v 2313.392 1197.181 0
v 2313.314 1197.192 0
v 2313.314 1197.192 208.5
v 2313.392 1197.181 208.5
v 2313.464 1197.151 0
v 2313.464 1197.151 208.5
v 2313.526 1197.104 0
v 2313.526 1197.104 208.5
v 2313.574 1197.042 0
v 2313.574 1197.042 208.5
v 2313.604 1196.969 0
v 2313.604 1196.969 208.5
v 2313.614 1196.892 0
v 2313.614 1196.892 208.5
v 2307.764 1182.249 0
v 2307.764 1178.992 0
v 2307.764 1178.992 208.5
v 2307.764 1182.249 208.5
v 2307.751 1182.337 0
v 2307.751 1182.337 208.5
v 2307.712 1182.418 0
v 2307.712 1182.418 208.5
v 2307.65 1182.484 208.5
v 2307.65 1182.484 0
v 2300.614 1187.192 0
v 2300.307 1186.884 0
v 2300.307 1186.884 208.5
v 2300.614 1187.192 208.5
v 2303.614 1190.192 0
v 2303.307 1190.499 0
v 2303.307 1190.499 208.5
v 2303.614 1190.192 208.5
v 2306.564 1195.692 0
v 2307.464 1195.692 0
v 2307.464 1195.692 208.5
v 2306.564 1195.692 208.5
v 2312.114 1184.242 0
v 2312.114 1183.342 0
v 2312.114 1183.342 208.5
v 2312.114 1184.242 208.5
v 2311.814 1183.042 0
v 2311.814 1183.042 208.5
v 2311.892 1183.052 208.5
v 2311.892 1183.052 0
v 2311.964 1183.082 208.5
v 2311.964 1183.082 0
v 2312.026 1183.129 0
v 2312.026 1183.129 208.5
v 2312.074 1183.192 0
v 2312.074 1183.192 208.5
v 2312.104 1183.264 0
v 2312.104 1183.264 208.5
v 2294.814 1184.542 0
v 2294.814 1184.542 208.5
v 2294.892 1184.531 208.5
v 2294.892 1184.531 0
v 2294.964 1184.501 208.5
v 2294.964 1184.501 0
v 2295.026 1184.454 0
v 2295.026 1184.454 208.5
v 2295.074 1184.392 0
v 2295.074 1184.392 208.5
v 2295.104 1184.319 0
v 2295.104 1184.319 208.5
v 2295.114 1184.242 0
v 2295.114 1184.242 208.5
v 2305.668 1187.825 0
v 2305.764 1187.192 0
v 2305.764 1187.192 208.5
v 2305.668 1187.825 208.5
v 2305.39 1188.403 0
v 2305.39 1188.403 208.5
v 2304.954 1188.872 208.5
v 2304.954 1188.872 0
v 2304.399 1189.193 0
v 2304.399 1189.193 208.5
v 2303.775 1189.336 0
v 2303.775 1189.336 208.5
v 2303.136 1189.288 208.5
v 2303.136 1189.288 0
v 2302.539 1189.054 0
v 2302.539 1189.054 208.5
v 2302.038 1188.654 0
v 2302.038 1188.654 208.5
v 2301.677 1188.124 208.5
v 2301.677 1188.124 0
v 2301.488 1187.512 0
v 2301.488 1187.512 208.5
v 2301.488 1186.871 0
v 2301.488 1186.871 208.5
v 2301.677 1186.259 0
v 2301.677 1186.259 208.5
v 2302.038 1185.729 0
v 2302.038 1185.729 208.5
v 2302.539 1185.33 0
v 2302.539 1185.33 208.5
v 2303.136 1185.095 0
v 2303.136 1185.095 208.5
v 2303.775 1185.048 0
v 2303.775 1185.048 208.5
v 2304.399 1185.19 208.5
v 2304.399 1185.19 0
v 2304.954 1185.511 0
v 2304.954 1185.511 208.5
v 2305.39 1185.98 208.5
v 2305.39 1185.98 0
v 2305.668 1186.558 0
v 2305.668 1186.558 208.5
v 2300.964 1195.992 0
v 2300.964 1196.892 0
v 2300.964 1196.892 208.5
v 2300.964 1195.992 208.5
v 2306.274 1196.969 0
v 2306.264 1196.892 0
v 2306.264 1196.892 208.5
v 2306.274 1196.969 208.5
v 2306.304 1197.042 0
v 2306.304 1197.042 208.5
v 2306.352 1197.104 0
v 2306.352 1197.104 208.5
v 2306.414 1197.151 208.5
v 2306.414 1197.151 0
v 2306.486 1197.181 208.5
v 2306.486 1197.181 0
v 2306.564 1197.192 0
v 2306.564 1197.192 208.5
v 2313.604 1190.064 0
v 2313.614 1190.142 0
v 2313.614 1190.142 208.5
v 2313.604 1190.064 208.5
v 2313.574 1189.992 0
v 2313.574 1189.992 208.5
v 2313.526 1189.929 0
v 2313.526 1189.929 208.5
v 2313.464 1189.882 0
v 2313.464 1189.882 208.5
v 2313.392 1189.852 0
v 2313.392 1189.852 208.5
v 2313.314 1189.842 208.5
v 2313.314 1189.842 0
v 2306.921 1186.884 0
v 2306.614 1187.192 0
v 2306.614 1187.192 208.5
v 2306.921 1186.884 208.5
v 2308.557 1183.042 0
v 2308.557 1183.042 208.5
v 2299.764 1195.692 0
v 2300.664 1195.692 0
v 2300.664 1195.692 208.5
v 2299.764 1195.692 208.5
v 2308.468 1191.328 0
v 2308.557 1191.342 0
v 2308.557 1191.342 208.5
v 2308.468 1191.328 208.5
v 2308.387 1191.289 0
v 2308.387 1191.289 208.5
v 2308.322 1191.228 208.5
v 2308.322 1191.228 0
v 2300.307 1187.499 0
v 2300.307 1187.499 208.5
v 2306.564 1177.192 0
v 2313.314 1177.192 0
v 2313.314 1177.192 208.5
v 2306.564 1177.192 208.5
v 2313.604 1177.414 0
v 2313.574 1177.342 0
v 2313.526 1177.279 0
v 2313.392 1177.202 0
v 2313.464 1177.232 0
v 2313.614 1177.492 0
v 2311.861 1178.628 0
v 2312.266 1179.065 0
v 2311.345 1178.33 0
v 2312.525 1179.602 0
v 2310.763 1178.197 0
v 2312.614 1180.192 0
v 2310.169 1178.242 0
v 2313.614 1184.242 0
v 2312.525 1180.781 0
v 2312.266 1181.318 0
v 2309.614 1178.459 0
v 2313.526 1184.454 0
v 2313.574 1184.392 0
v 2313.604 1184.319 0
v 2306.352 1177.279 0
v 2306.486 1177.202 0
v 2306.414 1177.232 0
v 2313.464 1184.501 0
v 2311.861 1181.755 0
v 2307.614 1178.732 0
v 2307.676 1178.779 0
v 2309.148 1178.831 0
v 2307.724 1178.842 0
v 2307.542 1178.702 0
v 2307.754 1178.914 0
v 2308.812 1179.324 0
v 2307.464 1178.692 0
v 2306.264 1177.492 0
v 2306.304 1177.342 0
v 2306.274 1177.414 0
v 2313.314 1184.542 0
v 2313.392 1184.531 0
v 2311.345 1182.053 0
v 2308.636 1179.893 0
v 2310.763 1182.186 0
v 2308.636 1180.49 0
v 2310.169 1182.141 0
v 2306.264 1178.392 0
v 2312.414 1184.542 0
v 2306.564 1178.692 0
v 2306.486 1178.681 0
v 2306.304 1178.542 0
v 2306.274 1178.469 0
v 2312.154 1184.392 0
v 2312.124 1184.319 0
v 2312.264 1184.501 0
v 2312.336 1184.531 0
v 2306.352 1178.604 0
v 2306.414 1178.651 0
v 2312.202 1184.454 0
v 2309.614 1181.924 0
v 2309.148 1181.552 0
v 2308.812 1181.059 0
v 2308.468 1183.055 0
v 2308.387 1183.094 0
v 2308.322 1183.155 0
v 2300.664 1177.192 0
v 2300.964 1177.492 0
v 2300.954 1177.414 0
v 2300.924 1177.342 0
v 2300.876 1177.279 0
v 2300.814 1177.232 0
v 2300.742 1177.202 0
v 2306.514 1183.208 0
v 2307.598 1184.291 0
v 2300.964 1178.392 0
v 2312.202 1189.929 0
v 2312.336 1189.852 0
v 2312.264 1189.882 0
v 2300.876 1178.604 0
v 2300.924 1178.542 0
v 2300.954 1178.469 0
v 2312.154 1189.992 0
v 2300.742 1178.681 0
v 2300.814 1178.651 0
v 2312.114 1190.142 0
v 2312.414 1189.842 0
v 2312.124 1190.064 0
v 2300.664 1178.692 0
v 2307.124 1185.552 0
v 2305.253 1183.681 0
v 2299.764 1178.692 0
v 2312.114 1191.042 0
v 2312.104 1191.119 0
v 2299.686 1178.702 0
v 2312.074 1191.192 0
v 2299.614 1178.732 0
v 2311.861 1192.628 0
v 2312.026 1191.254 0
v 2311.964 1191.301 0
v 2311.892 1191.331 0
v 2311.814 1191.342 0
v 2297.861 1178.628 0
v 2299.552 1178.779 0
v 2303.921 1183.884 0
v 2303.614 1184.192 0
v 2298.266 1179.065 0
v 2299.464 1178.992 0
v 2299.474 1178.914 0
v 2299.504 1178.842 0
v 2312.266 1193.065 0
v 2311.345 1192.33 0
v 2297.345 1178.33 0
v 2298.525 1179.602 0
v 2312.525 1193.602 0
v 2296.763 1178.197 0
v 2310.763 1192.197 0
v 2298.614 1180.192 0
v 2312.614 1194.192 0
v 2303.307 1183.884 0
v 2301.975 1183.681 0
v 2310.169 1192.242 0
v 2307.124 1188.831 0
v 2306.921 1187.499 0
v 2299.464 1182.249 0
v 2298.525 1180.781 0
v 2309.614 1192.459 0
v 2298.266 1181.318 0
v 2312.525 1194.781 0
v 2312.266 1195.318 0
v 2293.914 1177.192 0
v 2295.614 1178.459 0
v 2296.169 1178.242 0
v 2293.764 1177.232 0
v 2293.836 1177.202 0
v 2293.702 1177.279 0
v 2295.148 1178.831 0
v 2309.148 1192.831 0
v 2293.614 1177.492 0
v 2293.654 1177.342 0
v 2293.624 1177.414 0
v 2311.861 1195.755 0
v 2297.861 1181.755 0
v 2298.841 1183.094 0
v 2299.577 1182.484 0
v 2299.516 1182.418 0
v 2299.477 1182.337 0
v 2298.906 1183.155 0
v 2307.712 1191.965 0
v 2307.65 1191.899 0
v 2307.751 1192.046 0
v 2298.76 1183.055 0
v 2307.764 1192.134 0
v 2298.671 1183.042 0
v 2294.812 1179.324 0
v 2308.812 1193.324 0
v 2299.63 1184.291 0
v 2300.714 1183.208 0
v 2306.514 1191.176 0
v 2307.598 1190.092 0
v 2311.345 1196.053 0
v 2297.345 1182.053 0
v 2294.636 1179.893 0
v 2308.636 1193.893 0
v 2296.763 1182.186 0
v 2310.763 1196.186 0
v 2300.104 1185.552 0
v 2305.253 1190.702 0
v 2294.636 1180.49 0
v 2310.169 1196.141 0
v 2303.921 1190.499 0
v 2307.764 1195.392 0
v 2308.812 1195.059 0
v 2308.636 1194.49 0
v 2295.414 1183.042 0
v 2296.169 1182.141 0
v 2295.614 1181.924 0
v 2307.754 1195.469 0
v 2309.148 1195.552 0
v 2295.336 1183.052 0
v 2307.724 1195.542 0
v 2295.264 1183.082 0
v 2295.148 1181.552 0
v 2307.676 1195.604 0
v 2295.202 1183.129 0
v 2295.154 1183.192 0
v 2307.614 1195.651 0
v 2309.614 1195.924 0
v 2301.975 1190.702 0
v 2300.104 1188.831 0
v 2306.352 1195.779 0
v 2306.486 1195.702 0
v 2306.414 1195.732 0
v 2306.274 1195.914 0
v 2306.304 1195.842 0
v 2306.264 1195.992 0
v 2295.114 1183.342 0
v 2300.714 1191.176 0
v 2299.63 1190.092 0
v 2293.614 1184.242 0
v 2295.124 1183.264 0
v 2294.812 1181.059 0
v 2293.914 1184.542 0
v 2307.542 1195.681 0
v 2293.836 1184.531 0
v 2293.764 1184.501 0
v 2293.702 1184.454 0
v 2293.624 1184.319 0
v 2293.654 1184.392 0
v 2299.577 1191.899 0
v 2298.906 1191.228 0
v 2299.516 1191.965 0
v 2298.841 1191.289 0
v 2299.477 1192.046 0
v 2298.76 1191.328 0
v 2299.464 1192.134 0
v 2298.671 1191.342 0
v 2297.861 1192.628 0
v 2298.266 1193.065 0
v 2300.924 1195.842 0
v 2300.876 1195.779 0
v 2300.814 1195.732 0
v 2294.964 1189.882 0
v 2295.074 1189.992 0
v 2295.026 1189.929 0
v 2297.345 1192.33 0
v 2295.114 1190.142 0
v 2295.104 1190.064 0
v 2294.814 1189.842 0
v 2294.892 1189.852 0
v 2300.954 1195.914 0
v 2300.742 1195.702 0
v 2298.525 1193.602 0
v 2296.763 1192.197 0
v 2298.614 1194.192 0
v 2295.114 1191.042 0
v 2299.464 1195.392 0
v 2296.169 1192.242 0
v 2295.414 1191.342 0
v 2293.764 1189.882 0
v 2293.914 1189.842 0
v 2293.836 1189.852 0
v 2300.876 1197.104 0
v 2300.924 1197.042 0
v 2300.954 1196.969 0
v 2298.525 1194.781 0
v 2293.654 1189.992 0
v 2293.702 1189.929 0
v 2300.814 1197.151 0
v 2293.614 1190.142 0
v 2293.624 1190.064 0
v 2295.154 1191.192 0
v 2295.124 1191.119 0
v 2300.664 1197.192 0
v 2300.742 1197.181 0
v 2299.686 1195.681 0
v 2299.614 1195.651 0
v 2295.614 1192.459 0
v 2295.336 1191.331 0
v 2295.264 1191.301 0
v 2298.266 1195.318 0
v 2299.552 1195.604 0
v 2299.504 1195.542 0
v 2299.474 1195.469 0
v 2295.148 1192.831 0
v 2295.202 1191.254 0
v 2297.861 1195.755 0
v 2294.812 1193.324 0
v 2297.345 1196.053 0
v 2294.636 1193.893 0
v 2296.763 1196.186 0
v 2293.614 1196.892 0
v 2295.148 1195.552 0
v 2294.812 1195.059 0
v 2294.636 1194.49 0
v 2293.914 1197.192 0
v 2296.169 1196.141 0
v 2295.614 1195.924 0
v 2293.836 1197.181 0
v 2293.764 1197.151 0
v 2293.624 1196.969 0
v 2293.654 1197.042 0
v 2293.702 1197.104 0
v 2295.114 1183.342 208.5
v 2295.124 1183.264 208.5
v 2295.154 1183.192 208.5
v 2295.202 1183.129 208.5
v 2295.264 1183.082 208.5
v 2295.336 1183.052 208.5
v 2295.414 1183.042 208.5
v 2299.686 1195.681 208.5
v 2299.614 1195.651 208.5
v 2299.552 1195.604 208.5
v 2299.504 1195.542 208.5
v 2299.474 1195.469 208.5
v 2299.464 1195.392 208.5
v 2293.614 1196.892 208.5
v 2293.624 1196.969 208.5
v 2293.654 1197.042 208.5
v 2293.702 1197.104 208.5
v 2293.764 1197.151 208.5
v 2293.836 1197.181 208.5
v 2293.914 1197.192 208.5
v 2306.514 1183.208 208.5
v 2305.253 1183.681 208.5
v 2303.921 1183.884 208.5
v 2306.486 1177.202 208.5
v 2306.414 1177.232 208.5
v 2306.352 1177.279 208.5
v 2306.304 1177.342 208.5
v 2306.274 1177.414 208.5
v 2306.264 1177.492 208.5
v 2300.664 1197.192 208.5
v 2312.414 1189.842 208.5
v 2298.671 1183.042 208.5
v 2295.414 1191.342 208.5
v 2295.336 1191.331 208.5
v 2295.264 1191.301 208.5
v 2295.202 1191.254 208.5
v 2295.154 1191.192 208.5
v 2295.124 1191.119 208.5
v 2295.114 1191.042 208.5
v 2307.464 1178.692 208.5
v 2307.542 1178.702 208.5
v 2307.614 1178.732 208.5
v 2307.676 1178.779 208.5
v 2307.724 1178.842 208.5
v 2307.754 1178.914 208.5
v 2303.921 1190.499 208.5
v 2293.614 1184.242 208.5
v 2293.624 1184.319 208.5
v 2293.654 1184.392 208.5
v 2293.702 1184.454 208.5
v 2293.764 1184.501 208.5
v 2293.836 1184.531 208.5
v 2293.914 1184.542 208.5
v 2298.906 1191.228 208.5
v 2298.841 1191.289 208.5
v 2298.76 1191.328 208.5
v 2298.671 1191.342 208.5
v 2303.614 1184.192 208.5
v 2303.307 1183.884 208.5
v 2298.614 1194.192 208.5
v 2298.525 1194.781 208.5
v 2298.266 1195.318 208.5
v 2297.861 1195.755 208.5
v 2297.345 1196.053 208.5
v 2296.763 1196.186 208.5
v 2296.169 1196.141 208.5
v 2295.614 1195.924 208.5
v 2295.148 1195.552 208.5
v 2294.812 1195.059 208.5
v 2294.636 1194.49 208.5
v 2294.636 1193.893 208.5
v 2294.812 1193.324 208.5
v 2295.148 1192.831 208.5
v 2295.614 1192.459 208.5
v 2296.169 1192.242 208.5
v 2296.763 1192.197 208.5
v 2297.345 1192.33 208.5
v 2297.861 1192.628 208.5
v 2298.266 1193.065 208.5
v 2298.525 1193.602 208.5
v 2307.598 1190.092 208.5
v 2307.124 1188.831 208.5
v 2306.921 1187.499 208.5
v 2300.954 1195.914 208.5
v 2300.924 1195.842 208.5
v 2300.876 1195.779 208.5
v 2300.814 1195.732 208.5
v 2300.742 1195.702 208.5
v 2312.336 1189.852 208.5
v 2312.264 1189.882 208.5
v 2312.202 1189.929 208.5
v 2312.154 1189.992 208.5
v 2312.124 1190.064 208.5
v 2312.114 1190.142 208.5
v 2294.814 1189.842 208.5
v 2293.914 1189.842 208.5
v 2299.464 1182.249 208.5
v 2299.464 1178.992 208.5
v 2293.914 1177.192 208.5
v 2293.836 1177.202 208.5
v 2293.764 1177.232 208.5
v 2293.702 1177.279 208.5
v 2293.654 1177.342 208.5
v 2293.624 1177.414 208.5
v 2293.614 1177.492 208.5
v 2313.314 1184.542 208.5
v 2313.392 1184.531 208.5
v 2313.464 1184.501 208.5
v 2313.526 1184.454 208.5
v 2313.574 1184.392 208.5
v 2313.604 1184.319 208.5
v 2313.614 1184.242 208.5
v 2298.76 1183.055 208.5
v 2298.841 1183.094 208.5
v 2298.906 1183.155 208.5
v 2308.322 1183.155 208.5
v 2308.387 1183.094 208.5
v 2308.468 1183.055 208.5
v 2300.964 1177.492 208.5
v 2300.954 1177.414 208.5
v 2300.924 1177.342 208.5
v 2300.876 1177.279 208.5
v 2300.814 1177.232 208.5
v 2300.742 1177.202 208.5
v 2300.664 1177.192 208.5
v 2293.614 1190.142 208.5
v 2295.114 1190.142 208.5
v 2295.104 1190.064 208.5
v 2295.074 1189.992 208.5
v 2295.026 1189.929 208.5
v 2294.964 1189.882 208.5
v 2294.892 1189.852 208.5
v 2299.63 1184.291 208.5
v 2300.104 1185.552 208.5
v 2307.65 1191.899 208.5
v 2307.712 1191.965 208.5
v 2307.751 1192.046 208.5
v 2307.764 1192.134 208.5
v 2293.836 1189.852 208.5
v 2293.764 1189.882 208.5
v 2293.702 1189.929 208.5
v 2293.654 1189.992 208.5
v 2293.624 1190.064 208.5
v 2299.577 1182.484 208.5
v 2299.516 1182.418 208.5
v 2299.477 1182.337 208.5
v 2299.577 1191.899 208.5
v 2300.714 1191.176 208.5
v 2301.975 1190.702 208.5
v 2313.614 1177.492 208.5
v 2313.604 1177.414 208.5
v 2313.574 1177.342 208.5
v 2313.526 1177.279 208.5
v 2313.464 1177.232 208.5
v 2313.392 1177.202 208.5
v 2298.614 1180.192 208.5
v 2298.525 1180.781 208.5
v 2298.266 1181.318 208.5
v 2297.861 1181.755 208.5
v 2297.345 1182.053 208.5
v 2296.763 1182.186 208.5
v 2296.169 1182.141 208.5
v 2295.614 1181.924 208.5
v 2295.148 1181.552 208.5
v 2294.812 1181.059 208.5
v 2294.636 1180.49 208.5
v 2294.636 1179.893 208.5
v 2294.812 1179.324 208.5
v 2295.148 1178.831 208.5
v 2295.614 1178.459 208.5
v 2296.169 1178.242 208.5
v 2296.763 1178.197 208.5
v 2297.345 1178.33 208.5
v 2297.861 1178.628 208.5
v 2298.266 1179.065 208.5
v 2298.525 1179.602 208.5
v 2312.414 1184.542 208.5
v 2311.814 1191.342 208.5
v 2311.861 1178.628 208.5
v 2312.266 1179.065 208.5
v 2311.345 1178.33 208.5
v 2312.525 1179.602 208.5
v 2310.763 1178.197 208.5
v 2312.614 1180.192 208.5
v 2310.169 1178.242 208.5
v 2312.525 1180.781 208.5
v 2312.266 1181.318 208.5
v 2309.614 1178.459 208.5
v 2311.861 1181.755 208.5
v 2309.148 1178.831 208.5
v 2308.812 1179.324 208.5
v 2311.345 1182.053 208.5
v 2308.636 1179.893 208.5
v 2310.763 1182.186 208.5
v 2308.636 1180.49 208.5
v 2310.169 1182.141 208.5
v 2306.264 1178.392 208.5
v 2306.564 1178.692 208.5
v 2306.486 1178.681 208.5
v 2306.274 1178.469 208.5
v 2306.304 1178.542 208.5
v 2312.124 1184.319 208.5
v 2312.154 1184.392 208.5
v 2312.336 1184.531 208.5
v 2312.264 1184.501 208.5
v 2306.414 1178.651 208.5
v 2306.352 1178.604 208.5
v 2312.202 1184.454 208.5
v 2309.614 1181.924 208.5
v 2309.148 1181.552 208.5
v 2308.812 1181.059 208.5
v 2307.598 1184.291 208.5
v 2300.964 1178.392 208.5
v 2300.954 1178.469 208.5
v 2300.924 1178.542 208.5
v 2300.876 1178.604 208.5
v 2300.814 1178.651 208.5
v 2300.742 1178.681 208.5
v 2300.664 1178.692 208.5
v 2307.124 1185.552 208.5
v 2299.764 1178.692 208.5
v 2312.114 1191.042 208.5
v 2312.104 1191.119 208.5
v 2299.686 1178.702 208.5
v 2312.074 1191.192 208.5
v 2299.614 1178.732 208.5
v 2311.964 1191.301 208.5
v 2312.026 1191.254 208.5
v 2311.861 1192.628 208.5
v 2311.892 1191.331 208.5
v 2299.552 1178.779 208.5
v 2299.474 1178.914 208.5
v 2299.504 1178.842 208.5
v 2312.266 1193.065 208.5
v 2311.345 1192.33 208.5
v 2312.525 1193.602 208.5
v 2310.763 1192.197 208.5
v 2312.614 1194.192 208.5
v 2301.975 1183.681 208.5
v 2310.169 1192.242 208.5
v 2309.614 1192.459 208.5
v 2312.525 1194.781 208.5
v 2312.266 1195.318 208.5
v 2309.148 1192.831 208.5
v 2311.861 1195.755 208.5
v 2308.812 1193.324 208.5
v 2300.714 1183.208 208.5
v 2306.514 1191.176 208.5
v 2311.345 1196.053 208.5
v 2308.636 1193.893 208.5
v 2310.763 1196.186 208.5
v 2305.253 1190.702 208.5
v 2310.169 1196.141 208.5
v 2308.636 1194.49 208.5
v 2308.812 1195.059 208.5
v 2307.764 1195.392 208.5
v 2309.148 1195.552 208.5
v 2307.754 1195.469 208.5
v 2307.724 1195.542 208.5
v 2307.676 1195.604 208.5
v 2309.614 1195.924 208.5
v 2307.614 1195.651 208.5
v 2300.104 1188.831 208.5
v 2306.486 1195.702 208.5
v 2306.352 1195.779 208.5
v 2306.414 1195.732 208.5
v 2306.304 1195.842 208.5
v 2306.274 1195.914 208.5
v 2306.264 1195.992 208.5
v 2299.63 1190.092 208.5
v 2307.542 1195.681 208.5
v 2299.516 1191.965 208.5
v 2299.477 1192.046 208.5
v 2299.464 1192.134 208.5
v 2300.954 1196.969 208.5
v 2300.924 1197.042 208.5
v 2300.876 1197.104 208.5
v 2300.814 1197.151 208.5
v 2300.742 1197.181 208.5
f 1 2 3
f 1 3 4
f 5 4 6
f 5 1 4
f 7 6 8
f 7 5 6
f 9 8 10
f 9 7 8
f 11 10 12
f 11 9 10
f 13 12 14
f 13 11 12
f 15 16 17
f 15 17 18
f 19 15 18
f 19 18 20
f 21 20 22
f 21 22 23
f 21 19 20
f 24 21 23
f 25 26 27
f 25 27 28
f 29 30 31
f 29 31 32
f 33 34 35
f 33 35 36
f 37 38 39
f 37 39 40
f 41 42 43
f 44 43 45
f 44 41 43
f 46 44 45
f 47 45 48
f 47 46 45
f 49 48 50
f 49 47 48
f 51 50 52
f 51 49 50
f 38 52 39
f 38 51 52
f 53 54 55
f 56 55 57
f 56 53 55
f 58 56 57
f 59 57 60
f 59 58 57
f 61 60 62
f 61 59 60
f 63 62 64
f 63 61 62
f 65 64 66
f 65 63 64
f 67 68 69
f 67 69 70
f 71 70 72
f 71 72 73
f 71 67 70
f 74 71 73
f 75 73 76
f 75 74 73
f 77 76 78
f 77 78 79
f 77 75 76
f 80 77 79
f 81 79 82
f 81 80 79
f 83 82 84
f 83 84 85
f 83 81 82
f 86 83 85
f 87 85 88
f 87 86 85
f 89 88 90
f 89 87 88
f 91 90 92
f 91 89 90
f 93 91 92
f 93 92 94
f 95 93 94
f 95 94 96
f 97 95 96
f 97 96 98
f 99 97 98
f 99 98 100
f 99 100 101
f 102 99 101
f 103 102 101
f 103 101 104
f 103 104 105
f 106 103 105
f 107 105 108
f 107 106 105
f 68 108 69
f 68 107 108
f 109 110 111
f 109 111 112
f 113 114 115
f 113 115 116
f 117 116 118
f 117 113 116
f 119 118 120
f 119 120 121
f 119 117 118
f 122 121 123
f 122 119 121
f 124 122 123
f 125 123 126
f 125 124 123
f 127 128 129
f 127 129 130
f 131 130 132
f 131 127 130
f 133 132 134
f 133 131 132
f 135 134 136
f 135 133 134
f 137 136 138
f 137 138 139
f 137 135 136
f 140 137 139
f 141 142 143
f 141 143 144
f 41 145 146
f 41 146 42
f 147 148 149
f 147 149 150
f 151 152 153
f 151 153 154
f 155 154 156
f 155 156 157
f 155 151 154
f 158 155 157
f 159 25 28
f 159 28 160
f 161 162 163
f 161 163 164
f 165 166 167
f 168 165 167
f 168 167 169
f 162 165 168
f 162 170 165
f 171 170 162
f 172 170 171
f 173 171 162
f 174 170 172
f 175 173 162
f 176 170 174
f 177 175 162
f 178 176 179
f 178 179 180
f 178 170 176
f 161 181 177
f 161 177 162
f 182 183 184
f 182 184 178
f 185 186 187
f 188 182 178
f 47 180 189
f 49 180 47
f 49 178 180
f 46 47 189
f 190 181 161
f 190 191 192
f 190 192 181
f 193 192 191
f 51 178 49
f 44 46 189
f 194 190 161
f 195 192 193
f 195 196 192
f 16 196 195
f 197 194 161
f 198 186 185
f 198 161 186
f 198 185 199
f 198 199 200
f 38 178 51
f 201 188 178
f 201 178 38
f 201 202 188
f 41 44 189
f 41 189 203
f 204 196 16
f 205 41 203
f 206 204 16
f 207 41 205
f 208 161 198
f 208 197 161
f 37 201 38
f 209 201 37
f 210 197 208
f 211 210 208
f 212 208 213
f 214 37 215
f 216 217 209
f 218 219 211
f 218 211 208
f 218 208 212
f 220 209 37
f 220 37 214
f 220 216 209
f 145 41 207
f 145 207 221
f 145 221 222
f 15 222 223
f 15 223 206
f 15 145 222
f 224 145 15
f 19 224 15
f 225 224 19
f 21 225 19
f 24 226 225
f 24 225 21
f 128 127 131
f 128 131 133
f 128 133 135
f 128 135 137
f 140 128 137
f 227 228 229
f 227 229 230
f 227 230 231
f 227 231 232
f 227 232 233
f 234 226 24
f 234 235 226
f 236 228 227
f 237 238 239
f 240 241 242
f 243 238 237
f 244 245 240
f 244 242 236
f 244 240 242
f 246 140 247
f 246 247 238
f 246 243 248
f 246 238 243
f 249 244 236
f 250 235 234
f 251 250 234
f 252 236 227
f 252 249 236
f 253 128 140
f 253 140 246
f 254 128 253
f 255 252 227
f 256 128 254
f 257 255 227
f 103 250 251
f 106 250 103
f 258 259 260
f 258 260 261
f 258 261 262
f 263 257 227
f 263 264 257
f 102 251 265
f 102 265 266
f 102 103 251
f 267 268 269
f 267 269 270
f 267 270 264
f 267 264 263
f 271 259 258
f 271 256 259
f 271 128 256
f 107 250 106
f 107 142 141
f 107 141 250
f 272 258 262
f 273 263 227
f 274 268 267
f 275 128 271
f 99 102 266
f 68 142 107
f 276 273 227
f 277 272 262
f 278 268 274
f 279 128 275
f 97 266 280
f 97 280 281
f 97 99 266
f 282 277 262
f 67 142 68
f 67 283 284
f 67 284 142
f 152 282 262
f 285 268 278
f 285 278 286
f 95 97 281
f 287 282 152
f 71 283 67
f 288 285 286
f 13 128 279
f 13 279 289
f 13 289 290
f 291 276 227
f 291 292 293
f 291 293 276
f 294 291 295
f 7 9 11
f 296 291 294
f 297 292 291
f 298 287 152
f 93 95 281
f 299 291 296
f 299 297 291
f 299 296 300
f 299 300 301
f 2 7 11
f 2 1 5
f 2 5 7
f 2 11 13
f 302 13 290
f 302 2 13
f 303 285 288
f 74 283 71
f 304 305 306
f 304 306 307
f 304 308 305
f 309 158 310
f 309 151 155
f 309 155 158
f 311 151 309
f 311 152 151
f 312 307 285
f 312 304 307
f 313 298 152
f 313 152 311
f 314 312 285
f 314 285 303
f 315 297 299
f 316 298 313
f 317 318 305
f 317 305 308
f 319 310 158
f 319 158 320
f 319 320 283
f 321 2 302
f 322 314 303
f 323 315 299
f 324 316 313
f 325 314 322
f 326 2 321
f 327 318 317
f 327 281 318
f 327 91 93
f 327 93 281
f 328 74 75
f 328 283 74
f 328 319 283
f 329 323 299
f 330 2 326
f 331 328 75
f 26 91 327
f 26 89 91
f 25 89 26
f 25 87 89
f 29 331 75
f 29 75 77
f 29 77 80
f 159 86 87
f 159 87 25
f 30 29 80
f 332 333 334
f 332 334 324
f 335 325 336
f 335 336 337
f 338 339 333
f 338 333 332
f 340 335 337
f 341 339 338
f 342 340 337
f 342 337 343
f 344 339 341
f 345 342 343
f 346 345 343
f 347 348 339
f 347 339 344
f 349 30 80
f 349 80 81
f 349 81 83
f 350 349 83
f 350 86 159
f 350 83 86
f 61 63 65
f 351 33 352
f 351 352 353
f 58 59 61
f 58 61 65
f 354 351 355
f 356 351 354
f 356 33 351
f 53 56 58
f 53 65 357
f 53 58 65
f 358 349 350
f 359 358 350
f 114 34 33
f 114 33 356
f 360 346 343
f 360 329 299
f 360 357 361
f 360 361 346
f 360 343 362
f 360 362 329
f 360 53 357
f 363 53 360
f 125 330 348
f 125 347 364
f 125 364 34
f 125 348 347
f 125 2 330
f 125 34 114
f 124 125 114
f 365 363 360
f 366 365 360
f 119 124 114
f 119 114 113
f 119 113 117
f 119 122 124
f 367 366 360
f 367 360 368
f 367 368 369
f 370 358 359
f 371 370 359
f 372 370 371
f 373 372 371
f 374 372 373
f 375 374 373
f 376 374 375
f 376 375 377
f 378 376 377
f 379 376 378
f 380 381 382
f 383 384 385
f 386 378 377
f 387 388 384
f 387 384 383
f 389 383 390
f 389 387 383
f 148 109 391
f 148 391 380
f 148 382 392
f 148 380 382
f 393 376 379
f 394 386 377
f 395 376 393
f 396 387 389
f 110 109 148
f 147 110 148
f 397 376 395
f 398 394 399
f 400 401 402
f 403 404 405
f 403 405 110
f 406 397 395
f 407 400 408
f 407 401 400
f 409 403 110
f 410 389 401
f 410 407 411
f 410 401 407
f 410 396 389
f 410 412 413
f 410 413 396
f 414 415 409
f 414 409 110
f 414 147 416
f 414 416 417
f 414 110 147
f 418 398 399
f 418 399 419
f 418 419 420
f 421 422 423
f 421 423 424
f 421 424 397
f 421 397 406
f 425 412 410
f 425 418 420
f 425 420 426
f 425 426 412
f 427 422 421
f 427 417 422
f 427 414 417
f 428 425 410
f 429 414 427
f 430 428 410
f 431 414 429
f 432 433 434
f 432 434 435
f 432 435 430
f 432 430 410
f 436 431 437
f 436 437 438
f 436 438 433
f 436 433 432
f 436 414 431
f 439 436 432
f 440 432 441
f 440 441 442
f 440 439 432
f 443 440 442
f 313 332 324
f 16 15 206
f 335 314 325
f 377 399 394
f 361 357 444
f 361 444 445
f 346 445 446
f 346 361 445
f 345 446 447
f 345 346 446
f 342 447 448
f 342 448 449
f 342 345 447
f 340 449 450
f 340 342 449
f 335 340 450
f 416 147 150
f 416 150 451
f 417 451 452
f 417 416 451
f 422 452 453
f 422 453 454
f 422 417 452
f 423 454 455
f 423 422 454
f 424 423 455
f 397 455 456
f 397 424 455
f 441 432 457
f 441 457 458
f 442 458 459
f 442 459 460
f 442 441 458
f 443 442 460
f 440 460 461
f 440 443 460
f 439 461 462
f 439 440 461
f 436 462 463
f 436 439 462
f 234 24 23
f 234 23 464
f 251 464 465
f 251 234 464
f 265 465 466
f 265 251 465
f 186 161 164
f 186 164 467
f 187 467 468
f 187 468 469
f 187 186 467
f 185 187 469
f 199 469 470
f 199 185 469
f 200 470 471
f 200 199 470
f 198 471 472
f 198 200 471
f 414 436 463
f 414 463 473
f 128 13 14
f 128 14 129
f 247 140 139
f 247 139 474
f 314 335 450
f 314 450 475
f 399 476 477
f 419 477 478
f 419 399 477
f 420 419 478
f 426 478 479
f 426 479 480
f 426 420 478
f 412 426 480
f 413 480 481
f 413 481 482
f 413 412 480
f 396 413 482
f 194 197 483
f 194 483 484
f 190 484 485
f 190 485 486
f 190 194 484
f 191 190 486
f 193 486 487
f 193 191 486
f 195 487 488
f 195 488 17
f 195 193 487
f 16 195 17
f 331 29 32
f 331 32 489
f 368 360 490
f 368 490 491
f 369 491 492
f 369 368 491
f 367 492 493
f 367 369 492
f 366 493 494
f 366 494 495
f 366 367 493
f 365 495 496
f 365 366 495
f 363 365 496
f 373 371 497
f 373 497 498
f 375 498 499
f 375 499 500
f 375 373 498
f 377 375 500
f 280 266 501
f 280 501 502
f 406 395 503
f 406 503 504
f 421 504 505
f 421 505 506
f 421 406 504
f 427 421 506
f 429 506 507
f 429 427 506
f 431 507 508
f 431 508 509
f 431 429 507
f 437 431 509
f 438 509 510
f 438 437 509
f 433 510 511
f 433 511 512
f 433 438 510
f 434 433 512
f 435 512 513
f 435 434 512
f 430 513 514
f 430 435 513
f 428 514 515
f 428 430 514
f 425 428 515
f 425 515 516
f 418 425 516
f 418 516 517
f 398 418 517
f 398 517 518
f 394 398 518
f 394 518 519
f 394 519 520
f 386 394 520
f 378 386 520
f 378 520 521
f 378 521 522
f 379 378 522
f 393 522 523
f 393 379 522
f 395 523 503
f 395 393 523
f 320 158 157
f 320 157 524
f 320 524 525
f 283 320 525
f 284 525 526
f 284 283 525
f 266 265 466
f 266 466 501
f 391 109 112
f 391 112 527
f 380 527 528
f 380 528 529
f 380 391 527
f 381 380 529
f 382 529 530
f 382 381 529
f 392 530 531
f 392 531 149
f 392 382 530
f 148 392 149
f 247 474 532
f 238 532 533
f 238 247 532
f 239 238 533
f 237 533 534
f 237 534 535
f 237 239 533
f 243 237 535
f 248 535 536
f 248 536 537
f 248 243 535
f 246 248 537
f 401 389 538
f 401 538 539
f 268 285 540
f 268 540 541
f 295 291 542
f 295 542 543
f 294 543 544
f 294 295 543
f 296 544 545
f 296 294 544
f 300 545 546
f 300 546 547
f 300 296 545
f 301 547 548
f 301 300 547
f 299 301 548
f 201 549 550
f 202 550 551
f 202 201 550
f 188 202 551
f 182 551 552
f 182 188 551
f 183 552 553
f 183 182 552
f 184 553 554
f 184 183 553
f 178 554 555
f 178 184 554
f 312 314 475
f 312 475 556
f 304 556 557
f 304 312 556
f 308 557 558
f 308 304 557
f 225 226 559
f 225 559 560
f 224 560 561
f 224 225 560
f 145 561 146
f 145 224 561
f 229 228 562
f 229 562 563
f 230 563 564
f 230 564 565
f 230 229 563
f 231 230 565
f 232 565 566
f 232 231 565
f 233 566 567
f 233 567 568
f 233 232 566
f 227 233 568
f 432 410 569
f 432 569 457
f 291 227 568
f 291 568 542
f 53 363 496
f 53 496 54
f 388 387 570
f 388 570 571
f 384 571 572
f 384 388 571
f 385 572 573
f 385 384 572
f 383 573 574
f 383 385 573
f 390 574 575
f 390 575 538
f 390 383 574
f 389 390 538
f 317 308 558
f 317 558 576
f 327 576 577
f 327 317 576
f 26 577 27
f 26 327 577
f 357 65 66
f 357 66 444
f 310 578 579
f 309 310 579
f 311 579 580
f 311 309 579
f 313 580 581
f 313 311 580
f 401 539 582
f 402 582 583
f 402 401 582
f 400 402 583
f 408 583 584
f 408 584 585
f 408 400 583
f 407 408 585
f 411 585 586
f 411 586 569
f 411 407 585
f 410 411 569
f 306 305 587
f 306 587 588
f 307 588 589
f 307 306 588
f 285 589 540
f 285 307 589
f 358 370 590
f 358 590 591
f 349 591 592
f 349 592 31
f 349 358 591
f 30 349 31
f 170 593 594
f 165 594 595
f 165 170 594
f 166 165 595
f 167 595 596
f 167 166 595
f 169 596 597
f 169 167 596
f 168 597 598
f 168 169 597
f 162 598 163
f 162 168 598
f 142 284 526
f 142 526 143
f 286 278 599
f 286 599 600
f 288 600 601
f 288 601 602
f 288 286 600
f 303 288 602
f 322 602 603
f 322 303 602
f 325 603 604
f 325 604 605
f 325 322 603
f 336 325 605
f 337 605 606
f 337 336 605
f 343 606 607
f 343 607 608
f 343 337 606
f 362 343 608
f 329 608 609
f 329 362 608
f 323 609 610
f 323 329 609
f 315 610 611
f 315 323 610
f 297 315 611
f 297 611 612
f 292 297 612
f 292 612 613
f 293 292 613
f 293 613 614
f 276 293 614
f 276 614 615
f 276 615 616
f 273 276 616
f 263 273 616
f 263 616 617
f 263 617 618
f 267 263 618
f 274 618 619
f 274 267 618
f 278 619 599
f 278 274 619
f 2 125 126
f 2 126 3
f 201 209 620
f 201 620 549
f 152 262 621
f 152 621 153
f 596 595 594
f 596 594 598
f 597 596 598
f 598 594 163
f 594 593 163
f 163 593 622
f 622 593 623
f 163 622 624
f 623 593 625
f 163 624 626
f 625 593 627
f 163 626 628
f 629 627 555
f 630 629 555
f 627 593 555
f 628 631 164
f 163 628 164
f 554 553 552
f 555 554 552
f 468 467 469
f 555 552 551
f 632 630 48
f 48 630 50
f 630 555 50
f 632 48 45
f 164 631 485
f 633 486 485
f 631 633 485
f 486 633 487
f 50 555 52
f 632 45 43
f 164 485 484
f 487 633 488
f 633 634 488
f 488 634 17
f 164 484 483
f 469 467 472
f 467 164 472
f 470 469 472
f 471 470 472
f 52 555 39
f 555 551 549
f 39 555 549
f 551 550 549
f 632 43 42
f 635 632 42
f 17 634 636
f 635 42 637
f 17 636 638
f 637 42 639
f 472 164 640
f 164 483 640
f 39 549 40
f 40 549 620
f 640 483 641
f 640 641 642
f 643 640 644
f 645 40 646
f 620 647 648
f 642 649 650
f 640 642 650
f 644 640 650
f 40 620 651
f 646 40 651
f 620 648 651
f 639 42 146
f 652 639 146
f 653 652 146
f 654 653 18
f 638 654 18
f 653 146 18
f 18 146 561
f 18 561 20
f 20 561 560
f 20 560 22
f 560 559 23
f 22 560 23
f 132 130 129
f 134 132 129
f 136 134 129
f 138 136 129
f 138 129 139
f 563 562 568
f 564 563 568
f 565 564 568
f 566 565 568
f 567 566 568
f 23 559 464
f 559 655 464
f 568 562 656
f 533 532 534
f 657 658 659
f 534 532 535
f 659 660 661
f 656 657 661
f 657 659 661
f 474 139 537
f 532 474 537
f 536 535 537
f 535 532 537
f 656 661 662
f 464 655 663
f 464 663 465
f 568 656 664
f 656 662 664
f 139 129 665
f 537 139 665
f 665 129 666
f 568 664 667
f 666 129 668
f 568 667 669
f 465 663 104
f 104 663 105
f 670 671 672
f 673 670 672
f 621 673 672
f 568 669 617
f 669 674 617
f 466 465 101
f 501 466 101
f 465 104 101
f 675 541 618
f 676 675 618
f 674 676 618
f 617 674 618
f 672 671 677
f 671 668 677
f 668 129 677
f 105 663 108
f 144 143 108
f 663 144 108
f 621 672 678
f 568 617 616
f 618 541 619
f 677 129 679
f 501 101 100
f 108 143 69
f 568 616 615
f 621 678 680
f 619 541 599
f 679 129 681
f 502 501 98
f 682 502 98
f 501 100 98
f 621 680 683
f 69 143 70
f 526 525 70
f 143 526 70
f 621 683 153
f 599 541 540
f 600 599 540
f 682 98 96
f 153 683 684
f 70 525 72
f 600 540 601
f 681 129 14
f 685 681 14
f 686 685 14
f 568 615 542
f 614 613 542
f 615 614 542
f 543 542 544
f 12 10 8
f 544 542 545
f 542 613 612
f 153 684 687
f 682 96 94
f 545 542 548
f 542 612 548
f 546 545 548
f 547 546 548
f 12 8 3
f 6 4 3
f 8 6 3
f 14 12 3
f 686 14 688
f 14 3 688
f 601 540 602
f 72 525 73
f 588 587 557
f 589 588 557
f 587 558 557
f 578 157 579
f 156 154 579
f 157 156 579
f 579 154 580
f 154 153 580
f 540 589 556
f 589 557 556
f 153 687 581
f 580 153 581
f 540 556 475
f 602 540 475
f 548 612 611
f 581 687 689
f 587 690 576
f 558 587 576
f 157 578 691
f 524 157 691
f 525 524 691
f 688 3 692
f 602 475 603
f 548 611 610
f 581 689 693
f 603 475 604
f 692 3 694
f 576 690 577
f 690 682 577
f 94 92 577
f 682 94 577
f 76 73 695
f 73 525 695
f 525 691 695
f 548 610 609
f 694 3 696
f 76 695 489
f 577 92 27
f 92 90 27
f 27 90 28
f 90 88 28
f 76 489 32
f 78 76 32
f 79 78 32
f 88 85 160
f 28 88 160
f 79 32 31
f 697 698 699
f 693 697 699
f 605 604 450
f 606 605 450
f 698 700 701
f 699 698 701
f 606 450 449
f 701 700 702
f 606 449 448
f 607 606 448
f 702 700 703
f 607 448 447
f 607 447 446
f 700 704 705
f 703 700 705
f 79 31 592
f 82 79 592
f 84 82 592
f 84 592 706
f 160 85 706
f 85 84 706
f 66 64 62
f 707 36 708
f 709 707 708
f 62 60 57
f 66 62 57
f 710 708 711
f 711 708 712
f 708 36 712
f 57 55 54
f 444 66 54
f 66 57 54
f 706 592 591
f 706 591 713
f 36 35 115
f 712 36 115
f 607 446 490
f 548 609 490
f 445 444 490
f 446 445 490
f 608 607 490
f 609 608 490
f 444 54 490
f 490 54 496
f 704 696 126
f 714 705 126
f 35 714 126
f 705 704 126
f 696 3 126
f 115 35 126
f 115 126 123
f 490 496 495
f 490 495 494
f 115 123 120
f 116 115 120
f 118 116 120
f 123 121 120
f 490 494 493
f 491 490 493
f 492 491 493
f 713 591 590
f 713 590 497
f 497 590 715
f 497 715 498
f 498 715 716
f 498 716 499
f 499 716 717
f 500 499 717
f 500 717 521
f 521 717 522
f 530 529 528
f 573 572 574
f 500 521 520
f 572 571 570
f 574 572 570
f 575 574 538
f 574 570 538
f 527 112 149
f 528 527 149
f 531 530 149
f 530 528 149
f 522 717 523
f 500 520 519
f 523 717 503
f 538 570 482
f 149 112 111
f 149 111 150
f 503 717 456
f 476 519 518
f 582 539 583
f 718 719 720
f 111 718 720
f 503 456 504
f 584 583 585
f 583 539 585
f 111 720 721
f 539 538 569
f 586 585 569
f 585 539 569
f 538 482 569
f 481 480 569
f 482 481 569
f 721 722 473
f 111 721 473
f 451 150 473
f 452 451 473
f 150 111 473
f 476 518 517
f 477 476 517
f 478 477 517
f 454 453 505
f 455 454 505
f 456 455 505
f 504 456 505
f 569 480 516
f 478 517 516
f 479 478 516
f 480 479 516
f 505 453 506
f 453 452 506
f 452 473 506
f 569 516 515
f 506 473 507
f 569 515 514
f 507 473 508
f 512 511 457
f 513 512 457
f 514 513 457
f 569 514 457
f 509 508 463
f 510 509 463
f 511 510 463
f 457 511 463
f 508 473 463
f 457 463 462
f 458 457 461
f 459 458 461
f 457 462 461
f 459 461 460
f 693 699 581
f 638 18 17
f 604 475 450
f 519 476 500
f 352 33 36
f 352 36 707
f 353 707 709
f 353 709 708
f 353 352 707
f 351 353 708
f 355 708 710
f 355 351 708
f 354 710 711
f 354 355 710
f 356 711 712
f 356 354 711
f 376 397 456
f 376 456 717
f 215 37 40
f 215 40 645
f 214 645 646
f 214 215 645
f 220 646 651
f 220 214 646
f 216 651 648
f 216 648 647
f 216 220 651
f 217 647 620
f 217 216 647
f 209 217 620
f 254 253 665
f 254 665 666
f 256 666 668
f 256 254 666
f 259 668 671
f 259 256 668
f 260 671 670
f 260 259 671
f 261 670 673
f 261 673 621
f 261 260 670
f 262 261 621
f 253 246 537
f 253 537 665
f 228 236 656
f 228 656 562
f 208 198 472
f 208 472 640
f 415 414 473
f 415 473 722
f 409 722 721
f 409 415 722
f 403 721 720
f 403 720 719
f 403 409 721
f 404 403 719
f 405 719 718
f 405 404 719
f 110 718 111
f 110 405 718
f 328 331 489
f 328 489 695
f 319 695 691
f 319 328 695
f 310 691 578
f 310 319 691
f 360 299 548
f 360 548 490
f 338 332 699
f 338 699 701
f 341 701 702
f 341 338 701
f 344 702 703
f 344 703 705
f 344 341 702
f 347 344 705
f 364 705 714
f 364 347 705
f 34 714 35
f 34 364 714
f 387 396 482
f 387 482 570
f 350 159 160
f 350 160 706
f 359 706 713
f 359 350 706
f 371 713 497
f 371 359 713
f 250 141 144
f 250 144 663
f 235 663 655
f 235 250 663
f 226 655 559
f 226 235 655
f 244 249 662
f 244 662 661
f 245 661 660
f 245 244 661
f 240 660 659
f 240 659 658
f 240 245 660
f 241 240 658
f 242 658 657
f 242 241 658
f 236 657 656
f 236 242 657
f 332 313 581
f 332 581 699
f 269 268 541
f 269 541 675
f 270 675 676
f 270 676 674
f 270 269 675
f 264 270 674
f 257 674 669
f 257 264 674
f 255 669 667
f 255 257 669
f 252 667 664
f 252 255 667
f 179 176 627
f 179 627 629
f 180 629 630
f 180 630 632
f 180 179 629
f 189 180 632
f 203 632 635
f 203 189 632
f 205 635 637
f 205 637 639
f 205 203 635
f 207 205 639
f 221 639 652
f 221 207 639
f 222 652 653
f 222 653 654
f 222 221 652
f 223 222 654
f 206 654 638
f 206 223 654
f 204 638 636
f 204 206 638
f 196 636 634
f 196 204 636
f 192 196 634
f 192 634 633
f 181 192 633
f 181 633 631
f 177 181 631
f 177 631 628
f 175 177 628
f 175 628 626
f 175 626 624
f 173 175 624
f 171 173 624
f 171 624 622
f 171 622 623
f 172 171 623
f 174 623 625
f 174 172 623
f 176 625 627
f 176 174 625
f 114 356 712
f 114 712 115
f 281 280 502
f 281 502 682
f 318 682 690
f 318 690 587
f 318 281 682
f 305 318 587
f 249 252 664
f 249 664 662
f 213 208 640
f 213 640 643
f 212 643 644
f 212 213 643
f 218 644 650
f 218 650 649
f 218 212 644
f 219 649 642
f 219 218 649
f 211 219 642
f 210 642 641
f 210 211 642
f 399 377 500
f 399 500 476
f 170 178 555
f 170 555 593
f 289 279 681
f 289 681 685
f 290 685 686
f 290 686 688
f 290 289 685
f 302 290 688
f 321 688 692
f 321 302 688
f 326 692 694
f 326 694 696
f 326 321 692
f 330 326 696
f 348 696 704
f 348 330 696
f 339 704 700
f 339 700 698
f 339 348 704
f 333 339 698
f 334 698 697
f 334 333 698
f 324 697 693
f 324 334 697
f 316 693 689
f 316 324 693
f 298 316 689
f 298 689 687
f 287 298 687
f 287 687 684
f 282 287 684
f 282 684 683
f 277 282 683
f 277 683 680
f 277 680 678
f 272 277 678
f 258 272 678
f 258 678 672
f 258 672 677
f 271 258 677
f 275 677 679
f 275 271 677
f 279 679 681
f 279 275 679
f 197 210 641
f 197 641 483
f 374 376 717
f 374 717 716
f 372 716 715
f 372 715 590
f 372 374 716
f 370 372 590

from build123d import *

# Parameters (mm, degrees)
MODEL_R         = 2.15
MODEL_R_2       = 2
EXTRUDE_1_DEPTH = 208.5


with BuildPart() as part:
    # Model → 보스-돌출1 (new body)
    with BuildSketch(Plane.XY):
        with BuildLine():
            Line((2307.763927197, 1192.134297913), (2307.763927197, 1195.391548465))
            ThreePointArc((2307.763927197, 1195.391548465), (2307.676059232, 1195.603680499), (2307.463927197, 1195.691548465))
            Line((2307.463927197, 1195.691548465), (2306.563927197, 1195.691548465))
            ThreePointArc((2306.563927197, 1195.691548465), (2306.351795163, 1195.779416431), (2306.263927197, 1195.991548465))
            Line((2306.263927197, 1195.991548465), (2306.263927197, 1196.891548465))
            ThreePointArc((2306.263927197, 1196.891548465), (2306.351795163, 1197.103680499), (2306.563927197, 1197.191548465))
            Line((2306.563927197, 1197.191548465), (2313.313927197, 1197.191548465))
            ThreePointArc((2313.313927197, 1197.191548465), (2313.526059232, 1197.103680499), (2313.613927197, 1196.891548465))
            Line((2313.613927197, 1196.891548465), (2313.613927197, 1190.141548465))
            ThreePointArc((2313.613927197, 1190.141548465), (2313.526059232, 1189.929416431), (2313.313927197, 1189.841548465))
            Line((2313.313927197, 1189.841548465), (2312.413927197, 1189.841548465))
            ThreePointArc((2312.413927197, 1189.841548465), (2312.201795163, 1189.929416431), (2312.113927197, 1190.141548465))
            Line((2312.113927197, 1190.141548465), (2312.113927197, 1191.041548465))
            ThreePointArc((2312.113927197, 1191.041548465), (2312.026059232, 1191.253680499), (2311.813927197, 1191.341548465))
            Line((2311.813927197, 1191.341548465), (2308.556676645, 1191.341548465))
            ThreePointArc((2308.556676645, 1191.341548465), (2308.426234796, 1191.311705686), (2308.321744595, 1191.228114625))
            ThreePointArc((2308.321744595, 1191.228114625), (2307.328306374, 1189.47356999), (2306.921204563, 1187.498825831))
            Line((2306.921204563, 1187.498825831), (2306.613927197, 1187.191548465))
            Line((2306.613927197, 1187.191548465), (2306.921204563, 1186.884271099))
            ThreePointArc((2306.921204563, 1186.884271099), (2307.328306374, 1184.90952694), (2308.321744595, 1183.154982305))
            ThreePointArc((2308.321744595, 1183.154982305), (2308.426234796, 1183.071391244), (2308.556676645, 1183.041548465))
            Line((2308.556676645, 1183.041548465), (2311.813927197, 1183.041548465))
            ThreePointArc((2311.813927197, 1183.041548465), (2312.026059232, 1183.129416431), (2312.113927197, 1183.341548465))
            Line((2312.113927197, 1183.341548465), (2312.113927197, 1184.241548465))
            ThreePointArc((2312.113927197, 1184.241548465), (2312.201795163, 1184.453680499), (2312.413927197, 1184.541548465))
            Line((2312.413927197, 1184.541548465), (2313.313927197, 1184.541548465))
            ThreePointArc((2313.313927197, 1184.541548465), (2313.526059232, 1184.453680499), (2313.613927197, 1184.241548465))
            Line((2313.613927197, 1184.241548465), (2313.613927197, 1177.491548465))
            ThreePointArc((2313.613927197, 1177.491548465), (2313.526059232, 1177.279416431), (2313.313927197, 1177.191548465))
            Line((2313.313927197, 1177.191548465), (2306.563927197, 1177.191548465))
            ThreePointArc((2306.563927197, 1177.191548465), (2306.351795163, 1177.279416431), (2306.263927197, 1177.491548465))
            Line((2306.263927197, 1177.491548465), (2306.263927197, 1178.391548465))
            ThreePointArc((2306.263927197, 1178.391548465), (2306.351795163, 1178.603680499), (2306.563927197, 1178.691548465))
            Line((2306.563927197, 1178.691548465), (2307.463927197, 1178.691548465))
            ThreePointArc((2307.463927197, 1178.691548465), (2307.676059232, 1178.779416431), (2307.763927197, 1178.991548465))
            Line((2307.763927197, 1178.991548465), (2307.763927197, 1182.248799017))
            ThreePointArc((2307.763927197, 1182.248799017), (2307.734084418, 1182.379240866), (2307.650493357, 1182.483731067))
            ThreePointArc((2307.650493357, 1182.483731067), (2305.895948722, 1183.477169289), (2303.921204563, 1183.884271099))
            Line((2303.921204563, 1183.884271099), (2303.613927197, 1184.191548465))
            Line((2303.613927197, 1184.191548465), (2303.306649831, 1183.884271099))
            ThreePointArc((2303.306649831, 1183.884271099), (2301.331905673, 1183.477169289), (2299.577361038, 1182.483731067))
            ThreePointArc((2299.577361038, 1182.483731067), (2299.493769977, 1182.379240866), (2299.463927197, 1182.248799017))
            Line((2299.463927197, 1182.248799017), (2299.463927197, 1178.991548465))
            ThreePointArc((2299.463927197, 1178.991548465), (2299.551795163, 1178.779416431), (2299.763927197, 1178.691548465))
            Line((2299.763927197, 1178.691548465), (2300.663927197, 1178.691548465))
            ThreePointArc((2300.663927197, 1178.691548465), (2300.876059232, 1178.603680499), (2300.963927197, 1178.391548465))
            Line((2300.963927197, 1178.391548465), (2300.963927197, 1177.491548465))
            ThreePointArc((2300.963927197, 1177.491548465), (2300.876059232, 1177.279416431), (2300.663927197, 1177.191548465))
            Line((2300.663927197, 1177.191548465), (2293.913927197, 1177.191548465))
            ThreePointArc((2293.913927197, 1177.191548465), (2293.701795163, 1177.279416431), (2293.613927197, 1177.491548465))
            Line((2293.613927197, 1177.491548465), (2293.613927197, 1184.241548465))
            ThreePointArc((2293.613927197, 1184.241548465), (2293.701795163, 1184.453680499), (2293.913927197, 1184.541548465))
            Line((2293.913927197, 1184.541548465), (2294.813927197, 1184.541548465))
            ThreePointArc((2294.813927197, 1184.541548465), (2295.026059232, 1184.453680499), (2295.113927197, 1184.241548465))
            Line((2295.113927197, 1184.241548465), (2295.113927197, 1183.341548465))
            ThreePointArc((2295.113927197, 1183.341548465), (2295.201795163, 1183.129416431), (2295.413927197, 1183.041548465))
            Line((2295.413927197, 1183.041548465), (2298.671177749, 1183.041548465))
            ThreePointArc((2298.671177749, 1183.041548465), (2298.801619599, 1183.071391244), (2298.906109799, 1183.154982305))
            ThreePointArc((2298.906109799, 1183.154982305), (2299.899548021, 1184.90952694), (2300.306649831, 1186.884271099))
            Line((2300.306649831, 1186.884271099), (2300.613927197, 1187.191548465))
            Line((2300.613927197, 1187.191548465), (2300.306649831, 1187.498825831))
            ThreePointArc((2300.306649831, 1187.498825831), (2299.899548021, 1189.47356999), (2298.906109799, 1191.228114625))
            ThreePointArc((2298.906109799, 1191.228114625), (2298.801619599, 1191.311705686), (2298.671177749, 1191.341548465))
            Line((2298.671177749, 1191.341548465), (2295.413927197, 1191.341548465))
            ThreePointArc((2295.413927197, 1191.341548465), (2295.201795163, 1191.253680499), (2295.113927197, 1191.041548465))
            Line((2295.113927197, 1191.041548465), (2295.113927197, 1190.141548465))
            ThreePointArc((2295.113927197, 1190.141548465), (2295.026059232, 1189.929416431), (2294.813927197, 1189.841548465))
            Line((2294.813927197, 1189.841548465), (2293.913927197, 1189.841548465))
            ThreePointArc((2293.913927197, 1189.841548465), (2293.701795163, 1189.929416431), (2293.613927197, 1190.141548465))
            Line((2293.613927197, 1190.141548465), (2293.613927197, 1196.891548465))
            ThreePointArc((2293.613927197, 1196.891548465), (2293.701795163, 1197.103680499), (2293.913927197, 1197.191548465))
            Line((2293.913927197, 1197.191548465), (2300.663927197, 1197.191548465))
            ThreePointArc((2300.663927197, 1197.191548465), (2300.876059232, 1197.103680499), (2300.963927197, 1196.891548465))
            Line((2300.963927197, 1196.891548465), (2300.963927197, 1195.991548465))
            ThreePointArc((2300.963927197, 1195.991548465), (2300.876059232, 1195.779416431), (2300.663927197, 1195.691548465))
            Line((2300.663927197, 1195.691548465), (2299.763927197, 1195.691548465))
            ThreePointArc((2299.763927197, 1195.691548465), (2299.551795163, 1195.603680499), (2299.463927197, 1195.391548465))
            Line((2299.463927197, 1195.391548465), (2299.463927197, 1192.134297913))
            ThreePointArc((2299.463927197, 1192.134297913), (2299.493769977, 1192.003856063), (2299.577361038, 1191.899365863))
            ThreePointArc((2299.577361038, 1191.899365863), (2301.331905673, 1190.905927641), (2303.306649831, 1190.498825831))
            Line((2303.306649831, 1190.498825831), (2303.613927197, 1190.191548465))
            Line((2303.613927197, 1190.191548465), (2303.921204563, 1190.498825831))
            ThreePointArc((2303.921204563, 1190.498825831), (2305.895948722, 1190.905927641), (2307.650493357, 1191.899365863))
            ThreePointArc((2307.650493357, 1191.899365863), (2307.734084418, 1192.003856063), (2307.763927197, 1192.134297913))
        make_face()
        with Locations((2303.613927197, 1187.191548465)):
            Circle(MODEL_R, mode=Mode.SUBTRACT)
        with Locations((2296.613927197, 1194.191548465)):
            Circle(MODEL_R_2, mode=Mode.SUBTRACT)
        with Locations((2296.613927197, 1180.191548465)):
            Circle(MODEL_R_2, mode=Mode.SUBTRACT)
        with Locations((2310.613927197, 1194.191548465)):
            Circle(MODEL_R_2, mode=Mode.SUBTRACT)
        with Locations((2310.613927197, 1180.191548465)):
            Circle(MODEL_R_2, mode=Mode.SUBTRACT)
    extrude(amount=EXTRUDE_1_DEPTH)


solid = part.part
